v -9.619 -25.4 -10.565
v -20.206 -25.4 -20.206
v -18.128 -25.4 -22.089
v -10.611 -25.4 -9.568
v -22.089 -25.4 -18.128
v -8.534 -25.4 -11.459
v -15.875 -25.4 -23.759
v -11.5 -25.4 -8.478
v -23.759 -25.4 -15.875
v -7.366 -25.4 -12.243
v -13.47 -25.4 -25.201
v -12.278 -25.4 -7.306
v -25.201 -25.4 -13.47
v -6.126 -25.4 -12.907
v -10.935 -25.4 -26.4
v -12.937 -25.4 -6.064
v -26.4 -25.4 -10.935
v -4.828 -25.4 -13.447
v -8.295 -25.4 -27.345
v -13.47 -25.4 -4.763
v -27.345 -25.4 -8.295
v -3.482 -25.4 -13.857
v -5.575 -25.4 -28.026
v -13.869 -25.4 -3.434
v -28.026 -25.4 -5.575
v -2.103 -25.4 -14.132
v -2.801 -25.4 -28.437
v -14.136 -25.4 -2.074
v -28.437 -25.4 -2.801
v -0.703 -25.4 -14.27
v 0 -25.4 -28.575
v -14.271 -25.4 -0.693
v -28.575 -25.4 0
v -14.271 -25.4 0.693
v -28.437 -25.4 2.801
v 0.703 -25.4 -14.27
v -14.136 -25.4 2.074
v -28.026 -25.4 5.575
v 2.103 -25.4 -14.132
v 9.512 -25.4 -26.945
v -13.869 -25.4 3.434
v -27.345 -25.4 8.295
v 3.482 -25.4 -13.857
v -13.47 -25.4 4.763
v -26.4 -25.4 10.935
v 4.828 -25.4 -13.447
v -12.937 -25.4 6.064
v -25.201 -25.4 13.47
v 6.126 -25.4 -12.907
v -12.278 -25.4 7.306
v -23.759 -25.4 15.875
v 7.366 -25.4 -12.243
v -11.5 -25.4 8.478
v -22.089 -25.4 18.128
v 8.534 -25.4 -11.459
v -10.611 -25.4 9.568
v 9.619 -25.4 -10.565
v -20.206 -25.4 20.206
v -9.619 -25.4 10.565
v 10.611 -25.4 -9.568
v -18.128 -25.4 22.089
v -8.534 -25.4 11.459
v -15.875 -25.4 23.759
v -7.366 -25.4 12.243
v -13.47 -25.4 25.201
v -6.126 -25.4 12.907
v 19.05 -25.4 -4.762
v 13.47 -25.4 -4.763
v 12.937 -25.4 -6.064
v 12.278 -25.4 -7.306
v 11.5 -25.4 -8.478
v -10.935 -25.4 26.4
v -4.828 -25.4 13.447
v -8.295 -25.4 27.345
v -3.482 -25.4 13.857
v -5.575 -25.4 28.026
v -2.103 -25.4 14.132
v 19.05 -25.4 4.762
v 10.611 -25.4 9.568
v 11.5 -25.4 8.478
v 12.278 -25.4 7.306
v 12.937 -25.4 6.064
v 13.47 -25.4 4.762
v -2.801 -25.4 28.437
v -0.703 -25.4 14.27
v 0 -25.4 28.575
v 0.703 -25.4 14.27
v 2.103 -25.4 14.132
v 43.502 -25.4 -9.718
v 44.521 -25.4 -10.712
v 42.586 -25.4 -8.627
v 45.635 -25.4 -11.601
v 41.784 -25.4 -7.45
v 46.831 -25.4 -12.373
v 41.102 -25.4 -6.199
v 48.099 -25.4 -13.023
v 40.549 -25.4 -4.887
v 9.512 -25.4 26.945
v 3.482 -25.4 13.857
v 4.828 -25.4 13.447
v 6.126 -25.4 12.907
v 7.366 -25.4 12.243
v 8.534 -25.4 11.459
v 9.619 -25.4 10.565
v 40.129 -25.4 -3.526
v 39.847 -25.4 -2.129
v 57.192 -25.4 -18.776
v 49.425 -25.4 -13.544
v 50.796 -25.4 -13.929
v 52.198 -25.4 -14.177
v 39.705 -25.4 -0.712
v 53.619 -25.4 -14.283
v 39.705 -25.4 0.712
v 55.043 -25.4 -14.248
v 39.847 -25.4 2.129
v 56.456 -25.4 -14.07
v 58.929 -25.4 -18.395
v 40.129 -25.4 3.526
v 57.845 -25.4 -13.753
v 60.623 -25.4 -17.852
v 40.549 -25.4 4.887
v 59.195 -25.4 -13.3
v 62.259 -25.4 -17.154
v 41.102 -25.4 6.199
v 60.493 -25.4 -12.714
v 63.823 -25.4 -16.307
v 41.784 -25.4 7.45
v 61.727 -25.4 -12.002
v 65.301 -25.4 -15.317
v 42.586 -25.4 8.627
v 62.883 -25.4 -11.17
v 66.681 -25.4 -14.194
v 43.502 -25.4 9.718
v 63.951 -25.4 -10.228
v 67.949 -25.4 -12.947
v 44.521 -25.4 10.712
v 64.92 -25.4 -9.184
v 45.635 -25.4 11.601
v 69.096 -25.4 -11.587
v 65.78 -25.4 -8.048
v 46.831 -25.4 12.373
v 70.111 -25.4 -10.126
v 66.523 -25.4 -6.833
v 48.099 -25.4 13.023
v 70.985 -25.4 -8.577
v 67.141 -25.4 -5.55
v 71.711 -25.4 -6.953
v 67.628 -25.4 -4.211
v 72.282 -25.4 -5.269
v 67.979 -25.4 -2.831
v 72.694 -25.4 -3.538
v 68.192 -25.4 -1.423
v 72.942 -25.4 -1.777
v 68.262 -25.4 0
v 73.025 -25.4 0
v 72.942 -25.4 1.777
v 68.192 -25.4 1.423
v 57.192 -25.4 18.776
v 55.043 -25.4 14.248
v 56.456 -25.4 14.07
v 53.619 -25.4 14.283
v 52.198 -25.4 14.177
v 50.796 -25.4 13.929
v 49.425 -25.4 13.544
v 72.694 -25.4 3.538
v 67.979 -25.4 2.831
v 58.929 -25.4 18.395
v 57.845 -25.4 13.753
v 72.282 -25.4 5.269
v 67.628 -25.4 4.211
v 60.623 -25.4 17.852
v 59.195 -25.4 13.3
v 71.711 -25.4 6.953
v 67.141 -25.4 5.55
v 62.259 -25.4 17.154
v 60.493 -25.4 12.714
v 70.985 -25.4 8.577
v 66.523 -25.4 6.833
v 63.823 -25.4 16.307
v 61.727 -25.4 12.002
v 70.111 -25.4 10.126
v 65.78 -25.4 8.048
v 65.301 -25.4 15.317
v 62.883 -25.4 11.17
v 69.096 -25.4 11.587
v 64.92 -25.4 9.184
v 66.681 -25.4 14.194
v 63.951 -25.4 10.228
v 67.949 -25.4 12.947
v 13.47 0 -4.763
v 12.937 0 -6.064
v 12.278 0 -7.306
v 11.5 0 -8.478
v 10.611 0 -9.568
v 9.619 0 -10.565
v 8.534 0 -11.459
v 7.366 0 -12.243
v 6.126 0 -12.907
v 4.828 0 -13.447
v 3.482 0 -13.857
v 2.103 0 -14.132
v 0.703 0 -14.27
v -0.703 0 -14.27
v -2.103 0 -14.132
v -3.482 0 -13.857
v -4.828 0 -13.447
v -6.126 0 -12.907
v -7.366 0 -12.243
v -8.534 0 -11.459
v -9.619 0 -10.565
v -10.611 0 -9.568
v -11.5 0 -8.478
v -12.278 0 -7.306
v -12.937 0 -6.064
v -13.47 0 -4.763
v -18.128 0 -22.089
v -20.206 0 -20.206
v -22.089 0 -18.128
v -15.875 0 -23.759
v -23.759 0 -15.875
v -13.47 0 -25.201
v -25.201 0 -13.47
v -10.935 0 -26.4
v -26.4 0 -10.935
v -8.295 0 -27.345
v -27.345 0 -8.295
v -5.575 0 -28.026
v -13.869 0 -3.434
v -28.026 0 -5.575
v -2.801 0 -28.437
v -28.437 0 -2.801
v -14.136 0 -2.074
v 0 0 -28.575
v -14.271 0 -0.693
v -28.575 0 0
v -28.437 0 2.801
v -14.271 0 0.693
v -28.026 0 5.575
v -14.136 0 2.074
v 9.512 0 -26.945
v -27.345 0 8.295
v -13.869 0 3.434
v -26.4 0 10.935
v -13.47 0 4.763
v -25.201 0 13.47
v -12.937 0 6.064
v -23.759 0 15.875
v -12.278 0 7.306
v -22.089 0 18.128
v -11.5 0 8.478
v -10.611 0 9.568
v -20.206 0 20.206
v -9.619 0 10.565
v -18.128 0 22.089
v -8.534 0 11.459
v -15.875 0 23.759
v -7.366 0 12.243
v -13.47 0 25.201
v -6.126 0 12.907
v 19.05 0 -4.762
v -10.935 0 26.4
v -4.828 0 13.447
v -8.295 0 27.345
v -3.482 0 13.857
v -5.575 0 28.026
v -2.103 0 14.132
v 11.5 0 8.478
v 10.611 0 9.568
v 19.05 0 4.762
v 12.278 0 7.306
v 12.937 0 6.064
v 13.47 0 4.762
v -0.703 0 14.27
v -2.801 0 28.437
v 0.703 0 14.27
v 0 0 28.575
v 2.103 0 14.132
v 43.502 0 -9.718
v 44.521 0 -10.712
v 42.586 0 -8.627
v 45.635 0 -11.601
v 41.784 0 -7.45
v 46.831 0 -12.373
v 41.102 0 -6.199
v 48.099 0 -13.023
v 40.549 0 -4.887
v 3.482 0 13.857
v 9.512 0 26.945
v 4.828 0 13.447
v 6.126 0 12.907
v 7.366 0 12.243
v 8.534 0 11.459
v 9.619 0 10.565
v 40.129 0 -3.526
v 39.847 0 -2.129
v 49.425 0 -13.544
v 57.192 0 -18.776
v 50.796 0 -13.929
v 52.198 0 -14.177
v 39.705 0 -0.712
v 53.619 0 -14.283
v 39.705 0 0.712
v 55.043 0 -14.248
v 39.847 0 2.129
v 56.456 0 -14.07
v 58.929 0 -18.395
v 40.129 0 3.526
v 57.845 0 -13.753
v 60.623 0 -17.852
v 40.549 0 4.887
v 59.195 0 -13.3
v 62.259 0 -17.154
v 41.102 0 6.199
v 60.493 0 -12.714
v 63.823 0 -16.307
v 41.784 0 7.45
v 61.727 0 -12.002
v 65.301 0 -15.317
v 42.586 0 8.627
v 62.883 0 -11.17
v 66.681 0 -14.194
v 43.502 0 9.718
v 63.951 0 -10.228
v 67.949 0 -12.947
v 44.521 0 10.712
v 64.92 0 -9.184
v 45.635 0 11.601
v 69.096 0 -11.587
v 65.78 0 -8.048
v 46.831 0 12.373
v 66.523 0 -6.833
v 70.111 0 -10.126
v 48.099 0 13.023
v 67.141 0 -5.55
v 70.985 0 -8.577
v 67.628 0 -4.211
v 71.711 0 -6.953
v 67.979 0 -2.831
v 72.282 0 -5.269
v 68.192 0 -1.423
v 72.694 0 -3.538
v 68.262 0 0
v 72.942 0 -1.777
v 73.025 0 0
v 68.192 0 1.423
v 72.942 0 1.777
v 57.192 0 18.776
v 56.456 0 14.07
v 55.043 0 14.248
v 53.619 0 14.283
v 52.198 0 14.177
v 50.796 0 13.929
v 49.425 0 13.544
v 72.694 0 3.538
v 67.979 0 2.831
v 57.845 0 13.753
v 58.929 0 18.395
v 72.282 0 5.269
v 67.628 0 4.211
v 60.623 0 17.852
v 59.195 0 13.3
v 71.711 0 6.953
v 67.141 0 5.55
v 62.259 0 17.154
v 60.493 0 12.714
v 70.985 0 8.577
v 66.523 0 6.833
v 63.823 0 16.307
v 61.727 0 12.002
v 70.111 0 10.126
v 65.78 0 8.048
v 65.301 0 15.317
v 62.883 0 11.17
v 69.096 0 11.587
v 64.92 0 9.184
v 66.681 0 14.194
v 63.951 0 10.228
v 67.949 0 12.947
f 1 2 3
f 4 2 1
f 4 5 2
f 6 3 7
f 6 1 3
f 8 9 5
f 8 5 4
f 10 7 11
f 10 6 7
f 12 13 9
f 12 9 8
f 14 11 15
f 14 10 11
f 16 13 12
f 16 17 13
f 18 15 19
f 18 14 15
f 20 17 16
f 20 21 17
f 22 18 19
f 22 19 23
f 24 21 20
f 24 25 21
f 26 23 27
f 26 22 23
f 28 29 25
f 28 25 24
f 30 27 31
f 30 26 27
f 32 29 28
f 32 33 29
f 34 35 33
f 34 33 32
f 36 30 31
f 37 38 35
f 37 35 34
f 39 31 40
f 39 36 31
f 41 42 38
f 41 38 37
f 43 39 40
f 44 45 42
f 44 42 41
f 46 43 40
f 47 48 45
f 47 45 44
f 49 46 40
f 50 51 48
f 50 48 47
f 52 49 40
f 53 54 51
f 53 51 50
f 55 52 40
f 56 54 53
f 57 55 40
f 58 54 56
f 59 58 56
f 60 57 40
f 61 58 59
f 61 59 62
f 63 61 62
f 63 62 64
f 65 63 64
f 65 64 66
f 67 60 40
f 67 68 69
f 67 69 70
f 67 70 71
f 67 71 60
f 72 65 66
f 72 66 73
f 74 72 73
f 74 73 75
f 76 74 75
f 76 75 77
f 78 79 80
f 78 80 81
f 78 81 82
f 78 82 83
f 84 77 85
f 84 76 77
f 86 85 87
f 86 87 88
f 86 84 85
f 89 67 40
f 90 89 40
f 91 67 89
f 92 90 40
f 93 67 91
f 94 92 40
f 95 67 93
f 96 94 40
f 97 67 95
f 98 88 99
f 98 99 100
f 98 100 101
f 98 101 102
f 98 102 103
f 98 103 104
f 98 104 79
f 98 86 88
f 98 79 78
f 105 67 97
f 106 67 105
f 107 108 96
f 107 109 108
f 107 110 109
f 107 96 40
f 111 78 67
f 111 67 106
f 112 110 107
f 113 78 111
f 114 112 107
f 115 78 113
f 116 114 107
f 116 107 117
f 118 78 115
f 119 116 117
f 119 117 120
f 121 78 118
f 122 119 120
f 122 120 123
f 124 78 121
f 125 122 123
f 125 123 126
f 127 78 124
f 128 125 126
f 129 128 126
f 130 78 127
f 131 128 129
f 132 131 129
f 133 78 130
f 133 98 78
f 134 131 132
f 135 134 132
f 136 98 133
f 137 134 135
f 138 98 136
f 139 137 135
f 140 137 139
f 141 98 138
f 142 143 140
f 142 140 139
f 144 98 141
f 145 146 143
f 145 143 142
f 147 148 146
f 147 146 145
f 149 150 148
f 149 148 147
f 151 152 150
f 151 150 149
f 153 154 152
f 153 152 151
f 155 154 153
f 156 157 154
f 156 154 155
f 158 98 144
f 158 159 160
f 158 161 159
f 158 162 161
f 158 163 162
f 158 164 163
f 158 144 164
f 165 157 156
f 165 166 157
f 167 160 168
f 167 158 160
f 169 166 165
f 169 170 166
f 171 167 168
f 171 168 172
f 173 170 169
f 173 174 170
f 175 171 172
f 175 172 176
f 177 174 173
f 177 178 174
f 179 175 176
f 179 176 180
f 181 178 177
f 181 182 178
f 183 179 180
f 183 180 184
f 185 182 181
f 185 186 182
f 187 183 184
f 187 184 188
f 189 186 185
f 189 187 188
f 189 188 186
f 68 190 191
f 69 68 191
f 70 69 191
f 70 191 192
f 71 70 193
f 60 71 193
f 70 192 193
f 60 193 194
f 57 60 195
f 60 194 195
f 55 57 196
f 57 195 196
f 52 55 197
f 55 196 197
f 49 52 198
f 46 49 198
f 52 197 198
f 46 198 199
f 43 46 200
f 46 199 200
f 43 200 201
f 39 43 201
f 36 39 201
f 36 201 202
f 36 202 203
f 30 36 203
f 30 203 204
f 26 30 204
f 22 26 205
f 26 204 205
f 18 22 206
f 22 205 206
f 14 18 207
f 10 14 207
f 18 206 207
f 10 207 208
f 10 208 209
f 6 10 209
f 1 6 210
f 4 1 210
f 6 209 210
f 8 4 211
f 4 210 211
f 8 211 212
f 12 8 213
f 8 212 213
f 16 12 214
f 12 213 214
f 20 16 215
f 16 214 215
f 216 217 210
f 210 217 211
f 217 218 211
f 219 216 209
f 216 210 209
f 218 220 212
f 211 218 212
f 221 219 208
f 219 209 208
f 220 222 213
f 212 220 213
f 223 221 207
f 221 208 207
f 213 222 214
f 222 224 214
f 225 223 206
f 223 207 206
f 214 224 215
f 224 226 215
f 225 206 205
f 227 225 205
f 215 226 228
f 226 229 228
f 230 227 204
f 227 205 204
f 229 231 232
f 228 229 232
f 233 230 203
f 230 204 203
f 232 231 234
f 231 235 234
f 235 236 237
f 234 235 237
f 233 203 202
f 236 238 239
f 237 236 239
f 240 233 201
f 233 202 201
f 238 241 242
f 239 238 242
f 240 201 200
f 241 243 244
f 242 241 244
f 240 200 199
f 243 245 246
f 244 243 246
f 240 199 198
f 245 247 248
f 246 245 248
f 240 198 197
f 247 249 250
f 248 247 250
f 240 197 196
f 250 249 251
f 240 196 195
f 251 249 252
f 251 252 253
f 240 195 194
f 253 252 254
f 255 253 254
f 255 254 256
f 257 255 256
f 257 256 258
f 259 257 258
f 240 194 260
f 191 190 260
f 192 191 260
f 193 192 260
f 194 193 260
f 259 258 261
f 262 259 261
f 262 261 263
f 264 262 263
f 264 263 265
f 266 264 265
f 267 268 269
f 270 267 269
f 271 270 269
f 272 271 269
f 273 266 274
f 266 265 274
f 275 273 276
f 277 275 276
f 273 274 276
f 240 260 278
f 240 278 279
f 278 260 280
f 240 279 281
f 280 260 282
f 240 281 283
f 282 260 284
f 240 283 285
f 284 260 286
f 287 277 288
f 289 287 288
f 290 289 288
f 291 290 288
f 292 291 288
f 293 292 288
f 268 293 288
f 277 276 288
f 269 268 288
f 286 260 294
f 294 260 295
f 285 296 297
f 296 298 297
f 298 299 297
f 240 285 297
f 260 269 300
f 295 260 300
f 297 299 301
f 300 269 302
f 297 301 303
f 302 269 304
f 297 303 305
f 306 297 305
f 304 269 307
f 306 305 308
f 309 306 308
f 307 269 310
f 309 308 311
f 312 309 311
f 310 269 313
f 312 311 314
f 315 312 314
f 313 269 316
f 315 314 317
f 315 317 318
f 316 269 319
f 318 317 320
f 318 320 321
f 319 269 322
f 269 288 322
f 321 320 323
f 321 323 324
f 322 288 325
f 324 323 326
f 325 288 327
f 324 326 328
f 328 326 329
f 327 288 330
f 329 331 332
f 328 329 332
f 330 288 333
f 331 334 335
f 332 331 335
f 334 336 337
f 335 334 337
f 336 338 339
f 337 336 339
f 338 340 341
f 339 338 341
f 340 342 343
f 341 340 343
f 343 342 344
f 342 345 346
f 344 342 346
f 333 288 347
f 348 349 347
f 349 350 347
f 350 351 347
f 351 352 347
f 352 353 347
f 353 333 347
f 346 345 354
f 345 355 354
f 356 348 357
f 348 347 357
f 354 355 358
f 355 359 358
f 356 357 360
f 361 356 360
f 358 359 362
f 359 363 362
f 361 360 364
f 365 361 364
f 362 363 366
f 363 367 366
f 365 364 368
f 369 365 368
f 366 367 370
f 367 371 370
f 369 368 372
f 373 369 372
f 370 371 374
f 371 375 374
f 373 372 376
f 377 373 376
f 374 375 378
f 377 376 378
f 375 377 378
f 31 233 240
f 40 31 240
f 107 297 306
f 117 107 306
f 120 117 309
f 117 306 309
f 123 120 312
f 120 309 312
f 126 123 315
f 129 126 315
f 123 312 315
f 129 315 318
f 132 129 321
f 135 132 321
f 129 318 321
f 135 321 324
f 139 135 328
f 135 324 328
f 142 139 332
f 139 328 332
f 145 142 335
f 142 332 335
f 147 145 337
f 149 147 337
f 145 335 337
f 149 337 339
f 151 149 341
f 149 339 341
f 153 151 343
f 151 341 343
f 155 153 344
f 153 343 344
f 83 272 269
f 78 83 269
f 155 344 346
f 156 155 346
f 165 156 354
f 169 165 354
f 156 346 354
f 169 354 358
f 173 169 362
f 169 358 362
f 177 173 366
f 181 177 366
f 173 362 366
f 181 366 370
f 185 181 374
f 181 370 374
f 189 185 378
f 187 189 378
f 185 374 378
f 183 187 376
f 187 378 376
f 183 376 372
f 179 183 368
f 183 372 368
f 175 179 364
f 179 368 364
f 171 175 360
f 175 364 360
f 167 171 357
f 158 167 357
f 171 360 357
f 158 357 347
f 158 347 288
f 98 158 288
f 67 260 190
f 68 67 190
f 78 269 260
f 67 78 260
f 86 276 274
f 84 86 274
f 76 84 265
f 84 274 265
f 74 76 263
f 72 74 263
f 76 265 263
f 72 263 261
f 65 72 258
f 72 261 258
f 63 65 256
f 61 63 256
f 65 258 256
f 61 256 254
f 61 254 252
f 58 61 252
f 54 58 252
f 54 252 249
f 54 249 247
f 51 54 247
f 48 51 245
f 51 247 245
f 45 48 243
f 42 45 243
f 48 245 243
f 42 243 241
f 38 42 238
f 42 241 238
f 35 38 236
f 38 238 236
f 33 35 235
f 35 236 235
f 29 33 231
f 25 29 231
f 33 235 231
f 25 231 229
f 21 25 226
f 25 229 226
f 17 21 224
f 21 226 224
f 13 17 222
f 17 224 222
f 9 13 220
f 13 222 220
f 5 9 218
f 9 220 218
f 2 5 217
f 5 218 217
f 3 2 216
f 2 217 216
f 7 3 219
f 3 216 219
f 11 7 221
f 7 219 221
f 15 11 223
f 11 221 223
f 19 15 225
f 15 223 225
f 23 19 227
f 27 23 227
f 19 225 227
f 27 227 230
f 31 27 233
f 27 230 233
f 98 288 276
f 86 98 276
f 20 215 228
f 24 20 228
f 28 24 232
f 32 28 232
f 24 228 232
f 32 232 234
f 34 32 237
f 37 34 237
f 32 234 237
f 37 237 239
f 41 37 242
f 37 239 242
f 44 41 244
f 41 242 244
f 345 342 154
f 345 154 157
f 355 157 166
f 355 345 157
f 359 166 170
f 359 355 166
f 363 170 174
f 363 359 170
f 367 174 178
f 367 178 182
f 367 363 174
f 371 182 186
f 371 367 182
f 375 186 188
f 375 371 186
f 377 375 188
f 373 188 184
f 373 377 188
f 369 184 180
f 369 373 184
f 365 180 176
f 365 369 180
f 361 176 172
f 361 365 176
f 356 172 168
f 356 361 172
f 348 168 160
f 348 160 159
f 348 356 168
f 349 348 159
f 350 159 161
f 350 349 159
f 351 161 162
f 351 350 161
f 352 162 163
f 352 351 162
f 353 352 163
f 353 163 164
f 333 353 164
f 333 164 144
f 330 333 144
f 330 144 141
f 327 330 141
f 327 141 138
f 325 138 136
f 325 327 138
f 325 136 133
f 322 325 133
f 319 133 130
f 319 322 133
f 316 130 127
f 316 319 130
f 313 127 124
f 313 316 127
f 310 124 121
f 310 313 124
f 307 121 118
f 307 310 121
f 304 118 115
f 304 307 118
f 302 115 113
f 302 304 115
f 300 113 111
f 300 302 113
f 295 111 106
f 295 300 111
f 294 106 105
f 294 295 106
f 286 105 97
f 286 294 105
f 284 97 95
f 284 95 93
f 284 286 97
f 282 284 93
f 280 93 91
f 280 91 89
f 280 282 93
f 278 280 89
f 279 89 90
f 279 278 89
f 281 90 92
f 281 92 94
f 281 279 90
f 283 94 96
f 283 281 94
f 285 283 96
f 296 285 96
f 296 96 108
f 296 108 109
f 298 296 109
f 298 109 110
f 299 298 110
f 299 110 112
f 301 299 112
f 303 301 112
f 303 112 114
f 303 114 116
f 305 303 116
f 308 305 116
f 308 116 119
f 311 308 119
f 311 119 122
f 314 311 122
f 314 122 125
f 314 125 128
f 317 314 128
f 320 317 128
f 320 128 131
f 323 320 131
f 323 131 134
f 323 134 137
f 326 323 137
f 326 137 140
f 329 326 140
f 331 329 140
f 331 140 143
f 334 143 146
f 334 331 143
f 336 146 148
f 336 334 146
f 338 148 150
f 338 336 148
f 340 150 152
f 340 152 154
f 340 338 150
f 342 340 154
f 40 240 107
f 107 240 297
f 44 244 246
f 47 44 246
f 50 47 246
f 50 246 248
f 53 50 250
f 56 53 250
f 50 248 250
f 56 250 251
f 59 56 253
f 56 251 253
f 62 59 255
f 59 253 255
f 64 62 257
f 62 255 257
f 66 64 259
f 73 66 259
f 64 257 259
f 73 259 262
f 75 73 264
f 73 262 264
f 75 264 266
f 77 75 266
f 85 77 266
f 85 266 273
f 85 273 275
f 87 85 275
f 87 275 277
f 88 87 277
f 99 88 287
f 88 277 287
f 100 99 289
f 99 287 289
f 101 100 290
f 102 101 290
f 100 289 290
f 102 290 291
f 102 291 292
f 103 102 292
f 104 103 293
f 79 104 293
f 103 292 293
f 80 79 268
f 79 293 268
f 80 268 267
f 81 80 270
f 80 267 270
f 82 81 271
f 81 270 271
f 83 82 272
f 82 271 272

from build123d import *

# Parameters (mm, degrees)
F0_R     = 14.2875
F1_DEPTH = 25.4


with BuildPart() as f1:
    # F0 (on Front) → F1 (new body)
    with BuildSketch(Plane.XZ):
        with BuildLine():
            Line((9.5121844836, 26.9452959039), (0, 28.575))
            ThreePointArc((0, 28.575), (-28.575, 0), (0, -28.575))
            Line((0, -28.575), (9.5121844836, -26.9452959039))
            ThreePointArc((9.5121844836, -26.9452959039), (23.3274655355, -16.5033322905), (28.575, 0))
            ThreePointArc((28.575, 0), (23.3274655355, 16.5033322905), (9.5121844836, 26.9452959039))
        make_face()
        with BuildLine():
            ThreePointArc((-13.4703841816, 4.7625), (0, 14.2875), (13.4703841816, 4.7625))
            Line((13.4703841816, 4.7625), (19.05, 4.7625))
            Line((19.05, 4.7625), (19.05, -4.7625))
            Line((19.05, -4.7625), (13.4703841816, -4.7625))
            ThreePointArc((13.4703841816, -4.7625), (0, -14.2875), (-13.4703841816, -4.7625))
            Line((-13.4703841816, -4.7625), (-19.05, -4.7625))
            Line((-19.05, -4.7625), (-19.05, 4.7625))
            Line((-19.05, 4.7625), (-13.4703841816, 4.7625))
        make_face(mode=Mode.SUBTRACT)
        with BuildLine():
            Line((57.1919272622, 18.7764181619), (9.5121844836, 26.9452959039))
            ThreePointArc((9.5121844836, 26.9452959039), (23.3274655355, 16.5033322905), (28.575, 0))
            ThreePointArc((28.575, 0), (23.3274655355, -16.5033322905), (9.5121844836, -26.9452959039))
            Line((9.5121844836, -26.9452959039), (57.1919272622, -18.7764181619))
            ThreePointArc((57.1919272622, -18.7764181619), (34.925, 0), (57.1919272622, 18.7764181619))
        make_face()
        with BuildLine():
            ThreePointArc((73.025, 0), (68.5383952831, 12.2804730295), (57.1919272622, 18.7764181619))
            ThreePointArc((57.1919272622, 18.7764181619), (34.925, 0), (57.1919272622, -18.7764181619))
            ThreePointArc((57.1919272622, -18.7764181619), (68.5383952831, -12.2804730295), (73.025, 0))
        make_face()
        with Locations((53.975, 0)):
            Circle(F0_R, mode=Mode.SUBTRACT)
        with BuildLine():
            ThreePointArc((-13.4703841816, -4.7625), (-14.2875, 0), (-13.4703841816, 4.7625))
            Line((-13.4703841816, 4.7625), (-19.05, 4.7625))
            Line((-19.05, 4.7625), (-19.05, -4.7625))
            Line((-19.05, -4.7625), (-13.4703841816, -4.7625))
        make_face()
    extrude(amount=F1_DEPTH)


solid = f1.part
